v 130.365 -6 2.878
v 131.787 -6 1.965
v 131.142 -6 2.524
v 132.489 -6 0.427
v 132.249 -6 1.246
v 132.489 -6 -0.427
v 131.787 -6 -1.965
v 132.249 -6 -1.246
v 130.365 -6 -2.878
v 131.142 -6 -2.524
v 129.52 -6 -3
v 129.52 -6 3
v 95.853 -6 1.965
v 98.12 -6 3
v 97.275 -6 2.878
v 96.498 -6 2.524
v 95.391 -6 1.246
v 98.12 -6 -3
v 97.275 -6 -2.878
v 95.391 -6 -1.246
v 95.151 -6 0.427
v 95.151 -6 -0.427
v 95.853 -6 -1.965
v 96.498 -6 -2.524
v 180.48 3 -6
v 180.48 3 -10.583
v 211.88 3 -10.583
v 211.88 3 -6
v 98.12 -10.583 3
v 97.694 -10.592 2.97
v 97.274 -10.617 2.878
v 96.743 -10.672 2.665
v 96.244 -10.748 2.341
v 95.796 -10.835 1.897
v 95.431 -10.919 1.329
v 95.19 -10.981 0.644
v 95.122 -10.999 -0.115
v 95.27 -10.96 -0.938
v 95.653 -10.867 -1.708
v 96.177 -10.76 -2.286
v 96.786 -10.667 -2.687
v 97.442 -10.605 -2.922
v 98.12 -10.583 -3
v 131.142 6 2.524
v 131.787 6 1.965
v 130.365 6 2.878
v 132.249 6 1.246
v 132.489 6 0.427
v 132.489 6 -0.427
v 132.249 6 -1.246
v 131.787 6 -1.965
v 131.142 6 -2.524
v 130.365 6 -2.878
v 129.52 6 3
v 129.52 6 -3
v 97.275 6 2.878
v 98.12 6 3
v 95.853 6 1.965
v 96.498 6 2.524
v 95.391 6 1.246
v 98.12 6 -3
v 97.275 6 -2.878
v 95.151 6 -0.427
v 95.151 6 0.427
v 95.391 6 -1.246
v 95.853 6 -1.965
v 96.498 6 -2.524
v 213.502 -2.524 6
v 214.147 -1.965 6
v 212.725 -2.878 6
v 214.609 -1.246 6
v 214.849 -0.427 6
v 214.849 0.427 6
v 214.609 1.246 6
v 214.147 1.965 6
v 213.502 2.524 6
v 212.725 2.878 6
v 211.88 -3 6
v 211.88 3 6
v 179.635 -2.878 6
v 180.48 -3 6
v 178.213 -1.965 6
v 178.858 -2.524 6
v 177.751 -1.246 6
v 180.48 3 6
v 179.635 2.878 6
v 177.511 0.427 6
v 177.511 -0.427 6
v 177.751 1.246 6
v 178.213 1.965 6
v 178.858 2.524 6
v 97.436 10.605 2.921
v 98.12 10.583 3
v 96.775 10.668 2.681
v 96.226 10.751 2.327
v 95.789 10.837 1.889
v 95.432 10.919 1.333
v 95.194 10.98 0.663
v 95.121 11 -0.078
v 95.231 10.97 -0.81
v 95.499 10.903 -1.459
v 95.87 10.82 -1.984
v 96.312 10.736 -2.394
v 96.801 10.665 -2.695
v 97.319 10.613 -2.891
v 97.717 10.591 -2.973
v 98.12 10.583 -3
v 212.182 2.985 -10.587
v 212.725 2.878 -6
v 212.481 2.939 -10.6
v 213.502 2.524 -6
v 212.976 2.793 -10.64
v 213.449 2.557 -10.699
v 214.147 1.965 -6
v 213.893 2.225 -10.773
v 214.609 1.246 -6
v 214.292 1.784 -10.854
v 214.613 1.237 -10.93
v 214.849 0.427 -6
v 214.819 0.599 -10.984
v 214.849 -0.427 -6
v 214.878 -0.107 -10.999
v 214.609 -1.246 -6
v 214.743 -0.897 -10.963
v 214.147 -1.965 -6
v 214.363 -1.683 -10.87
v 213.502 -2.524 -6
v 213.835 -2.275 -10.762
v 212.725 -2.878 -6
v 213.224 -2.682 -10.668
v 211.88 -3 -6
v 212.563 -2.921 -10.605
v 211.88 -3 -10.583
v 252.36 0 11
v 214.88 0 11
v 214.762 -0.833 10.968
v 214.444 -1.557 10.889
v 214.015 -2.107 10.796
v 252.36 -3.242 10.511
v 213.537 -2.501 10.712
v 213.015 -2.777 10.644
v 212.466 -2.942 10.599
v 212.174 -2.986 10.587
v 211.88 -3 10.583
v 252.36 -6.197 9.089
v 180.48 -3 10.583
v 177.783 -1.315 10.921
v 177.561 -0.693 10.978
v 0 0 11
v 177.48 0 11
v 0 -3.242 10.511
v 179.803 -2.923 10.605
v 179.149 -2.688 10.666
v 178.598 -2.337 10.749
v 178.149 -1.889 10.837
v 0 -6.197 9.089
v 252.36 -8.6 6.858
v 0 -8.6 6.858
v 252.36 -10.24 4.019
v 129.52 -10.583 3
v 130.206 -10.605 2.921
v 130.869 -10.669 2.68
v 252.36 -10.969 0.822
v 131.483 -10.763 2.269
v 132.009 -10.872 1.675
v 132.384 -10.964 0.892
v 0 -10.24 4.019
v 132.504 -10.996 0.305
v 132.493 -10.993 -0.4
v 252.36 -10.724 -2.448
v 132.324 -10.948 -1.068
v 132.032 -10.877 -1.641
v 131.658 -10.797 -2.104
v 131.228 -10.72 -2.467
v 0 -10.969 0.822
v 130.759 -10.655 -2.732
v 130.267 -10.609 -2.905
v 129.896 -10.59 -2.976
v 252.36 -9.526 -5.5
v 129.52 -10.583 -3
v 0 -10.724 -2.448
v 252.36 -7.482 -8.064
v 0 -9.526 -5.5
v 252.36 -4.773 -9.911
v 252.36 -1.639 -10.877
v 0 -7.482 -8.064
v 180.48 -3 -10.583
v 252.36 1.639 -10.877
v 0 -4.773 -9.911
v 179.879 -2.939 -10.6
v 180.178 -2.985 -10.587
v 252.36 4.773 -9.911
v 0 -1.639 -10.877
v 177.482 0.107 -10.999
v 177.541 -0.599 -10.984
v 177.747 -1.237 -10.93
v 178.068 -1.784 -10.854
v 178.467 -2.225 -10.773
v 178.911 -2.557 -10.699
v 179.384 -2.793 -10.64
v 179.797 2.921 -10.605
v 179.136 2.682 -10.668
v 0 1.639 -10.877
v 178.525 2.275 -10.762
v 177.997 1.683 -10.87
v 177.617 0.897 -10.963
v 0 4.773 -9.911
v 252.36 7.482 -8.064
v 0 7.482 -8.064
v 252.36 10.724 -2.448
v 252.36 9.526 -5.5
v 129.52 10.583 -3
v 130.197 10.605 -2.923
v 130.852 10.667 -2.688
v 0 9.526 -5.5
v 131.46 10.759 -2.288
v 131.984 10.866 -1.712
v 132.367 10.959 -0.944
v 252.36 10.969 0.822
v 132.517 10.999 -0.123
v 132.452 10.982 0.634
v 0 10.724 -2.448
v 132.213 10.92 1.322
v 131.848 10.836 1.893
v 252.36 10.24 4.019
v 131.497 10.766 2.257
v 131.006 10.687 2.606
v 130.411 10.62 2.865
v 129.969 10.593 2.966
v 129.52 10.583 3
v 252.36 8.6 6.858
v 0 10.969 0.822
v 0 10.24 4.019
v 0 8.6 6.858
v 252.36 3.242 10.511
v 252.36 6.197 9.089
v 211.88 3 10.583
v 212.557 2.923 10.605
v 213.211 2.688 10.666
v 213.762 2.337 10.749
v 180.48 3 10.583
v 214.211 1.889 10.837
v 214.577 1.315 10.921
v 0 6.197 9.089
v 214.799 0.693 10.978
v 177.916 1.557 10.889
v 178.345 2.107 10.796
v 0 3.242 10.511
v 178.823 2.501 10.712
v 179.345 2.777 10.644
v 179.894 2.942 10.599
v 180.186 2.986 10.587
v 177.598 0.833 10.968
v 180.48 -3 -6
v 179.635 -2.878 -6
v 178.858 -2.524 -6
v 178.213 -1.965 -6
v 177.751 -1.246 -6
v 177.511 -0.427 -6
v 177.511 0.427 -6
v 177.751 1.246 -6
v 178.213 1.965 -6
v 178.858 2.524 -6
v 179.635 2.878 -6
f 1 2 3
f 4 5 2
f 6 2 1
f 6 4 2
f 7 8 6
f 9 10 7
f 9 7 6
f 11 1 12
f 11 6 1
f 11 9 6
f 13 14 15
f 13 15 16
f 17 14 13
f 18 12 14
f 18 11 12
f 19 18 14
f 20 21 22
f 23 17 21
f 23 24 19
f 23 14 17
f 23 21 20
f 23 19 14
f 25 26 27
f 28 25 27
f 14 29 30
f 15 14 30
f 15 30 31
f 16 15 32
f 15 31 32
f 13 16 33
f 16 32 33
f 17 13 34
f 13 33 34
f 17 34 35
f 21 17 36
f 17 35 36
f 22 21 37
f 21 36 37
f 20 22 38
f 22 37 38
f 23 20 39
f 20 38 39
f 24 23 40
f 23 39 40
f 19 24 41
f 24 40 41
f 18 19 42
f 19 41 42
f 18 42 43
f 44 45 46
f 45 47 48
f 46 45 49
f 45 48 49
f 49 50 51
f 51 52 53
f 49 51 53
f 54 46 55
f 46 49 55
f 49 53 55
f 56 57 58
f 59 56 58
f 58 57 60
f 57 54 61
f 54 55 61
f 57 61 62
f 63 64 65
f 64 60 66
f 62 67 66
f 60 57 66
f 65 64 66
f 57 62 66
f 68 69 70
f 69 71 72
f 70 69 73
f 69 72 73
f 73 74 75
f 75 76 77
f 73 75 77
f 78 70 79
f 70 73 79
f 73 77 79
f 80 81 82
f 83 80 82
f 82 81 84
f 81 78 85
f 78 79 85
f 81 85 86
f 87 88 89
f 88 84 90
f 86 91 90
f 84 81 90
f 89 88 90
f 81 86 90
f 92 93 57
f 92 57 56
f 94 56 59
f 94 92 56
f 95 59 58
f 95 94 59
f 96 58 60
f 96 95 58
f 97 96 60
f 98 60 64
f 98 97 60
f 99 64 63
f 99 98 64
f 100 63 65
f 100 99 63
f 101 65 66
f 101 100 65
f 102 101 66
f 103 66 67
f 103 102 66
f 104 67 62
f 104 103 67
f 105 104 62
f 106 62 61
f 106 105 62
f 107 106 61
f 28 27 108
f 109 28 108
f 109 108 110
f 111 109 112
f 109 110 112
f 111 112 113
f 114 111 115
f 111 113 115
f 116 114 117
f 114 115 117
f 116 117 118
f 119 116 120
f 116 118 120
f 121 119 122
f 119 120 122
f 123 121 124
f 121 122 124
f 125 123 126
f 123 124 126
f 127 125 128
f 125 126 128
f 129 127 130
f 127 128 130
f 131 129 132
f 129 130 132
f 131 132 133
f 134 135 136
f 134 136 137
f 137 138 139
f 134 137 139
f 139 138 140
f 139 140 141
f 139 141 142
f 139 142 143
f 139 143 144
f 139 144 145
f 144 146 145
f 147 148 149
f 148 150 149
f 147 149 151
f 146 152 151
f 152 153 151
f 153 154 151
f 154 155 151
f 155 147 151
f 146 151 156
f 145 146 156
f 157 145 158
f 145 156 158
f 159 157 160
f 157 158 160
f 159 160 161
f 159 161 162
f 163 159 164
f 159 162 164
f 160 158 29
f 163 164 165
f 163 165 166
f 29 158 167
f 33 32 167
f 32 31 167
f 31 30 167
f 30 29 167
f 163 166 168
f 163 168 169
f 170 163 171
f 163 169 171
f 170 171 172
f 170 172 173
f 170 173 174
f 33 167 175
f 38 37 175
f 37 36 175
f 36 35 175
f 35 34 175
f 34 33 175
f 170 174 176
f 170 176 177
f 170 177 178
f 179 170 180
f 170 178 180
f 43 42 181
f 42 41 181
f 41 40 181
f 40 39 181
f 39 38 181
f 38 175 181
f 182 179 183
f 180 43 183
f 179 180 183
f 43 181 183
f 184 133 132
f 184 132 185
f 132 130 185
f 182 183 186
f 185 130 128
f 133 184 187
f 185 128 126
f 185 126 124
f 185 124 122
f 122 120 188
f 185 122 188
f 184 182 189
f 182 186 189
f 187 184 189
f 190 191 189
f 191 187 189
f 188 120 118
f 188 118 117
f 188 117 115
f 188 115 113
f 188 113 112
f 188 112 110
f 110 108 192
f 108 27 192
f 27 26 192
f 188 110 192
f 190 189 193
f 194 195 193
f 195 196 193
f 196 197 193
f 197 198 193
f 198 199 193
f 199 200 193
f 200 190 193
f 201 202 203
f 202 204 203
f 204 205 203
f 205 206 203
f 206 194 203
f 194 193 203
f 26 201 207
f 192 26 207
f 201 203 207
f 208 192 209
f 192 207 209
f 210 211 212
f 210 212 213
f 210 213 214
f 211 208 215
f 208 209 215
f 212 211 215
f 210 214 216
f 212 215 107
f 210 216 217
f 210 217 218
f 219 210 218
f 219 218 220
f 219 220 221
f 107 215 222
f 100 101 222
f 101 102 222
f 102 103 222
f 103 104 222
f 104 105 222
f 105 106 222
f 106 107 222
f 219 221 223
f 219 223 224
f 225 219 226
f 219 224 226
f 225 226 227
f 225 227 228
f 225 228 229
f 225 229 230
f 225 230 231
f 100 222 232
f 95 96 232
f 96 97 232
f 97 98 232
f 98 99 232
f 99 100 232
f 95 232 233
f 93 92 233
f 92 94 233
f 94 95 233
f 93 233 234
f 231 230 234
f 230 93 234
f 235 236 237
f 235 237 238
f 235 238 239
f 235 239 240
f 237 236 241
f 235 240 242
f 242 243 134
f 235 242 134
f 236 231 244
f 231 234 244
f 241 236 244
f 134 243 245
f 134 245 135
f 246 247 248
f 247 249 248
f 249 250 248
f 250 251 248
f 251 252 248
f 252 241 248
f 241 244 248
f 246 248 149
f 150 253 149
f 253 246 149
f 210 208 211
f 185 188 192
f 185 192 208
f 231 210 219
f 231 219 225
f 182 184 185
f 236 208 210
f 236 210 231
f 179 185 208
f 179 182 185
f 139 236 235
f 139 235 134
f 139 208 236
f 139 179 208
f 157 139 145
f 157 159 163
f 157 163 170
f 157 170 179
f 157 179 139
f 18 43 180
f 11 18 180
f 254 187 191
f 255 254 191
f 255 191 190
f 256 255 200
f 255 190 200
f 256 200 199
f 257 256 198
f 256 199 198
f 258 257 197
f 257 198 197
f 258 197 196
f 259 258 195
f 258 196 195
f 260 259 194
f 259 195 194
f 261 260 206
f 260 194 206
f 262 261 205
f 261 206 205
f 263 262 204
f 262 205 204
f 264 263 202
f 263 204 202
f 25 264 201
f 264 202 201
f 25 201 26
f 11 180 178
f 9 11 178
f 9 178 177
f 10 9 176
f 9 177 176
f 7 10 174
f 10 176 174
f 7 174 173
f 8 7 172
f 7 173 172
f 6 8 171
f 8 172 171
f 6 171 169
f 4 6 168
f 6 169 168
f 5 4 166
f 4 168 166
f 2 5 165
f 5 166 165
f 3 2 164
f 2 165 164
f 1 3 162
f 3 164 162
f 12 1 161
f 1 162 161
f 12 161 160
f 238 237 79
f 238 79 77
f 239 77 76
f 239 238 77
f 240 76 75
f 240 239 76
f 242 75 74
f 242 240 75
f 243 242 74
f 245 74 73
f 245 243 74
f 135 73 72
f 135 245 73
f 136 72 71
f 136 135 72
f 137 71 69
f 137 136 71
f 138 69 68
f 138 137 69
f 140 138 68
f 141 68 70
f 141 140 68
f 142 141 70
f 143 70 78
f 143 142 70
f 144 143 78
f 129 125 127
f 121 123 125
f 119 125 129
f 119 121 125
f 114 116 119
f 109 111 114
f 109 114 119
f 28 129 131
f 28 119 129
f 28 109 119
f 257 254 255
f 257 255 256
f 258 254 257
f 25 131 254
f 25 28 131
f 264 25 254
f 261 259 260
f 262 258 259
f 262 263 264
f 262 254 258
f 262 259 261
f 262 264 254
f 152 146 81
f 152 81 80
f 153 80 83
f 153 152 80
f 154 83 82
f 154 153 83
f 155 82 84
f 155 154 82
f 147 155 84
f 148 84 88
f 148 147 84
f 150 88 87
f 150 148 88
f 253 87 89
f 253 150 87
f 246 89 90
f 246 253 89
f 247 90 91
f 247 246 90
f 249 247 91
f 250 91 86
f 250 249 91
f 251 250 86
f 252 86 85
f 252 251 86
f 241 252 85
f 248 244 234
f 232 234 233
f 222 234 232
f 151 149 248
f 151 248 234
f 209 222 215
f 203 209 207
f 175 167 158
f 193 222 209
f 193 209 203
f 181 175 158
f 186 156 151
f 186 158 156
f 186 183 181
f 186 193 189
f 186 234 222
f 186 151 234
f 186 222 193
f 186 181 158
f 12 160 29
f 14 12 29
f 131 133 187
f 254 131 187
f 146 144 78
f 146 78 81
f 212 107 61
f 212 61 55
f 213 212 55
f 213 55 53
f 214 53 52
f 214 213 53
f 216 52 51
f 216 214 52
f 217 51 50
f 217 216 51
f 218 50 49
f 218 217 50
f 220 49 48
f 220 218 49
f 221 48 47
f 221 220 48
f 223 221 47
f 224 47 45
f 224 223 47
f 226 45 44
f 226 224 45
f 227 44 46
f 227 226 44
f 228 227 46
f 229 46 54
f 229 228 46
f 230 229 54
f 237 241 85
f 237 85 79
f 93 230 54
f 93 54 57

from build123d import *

# Parameters (mm, degrees)
SKETCH1_W           = 140
SKETCH1_H           = 11
CUT_EXTRUDE1_DEPTH  = 5
SKETCH5_R           = 11
BOSS_EXTRUDE1_DEPTH = 97.36
CUT_EXTRUDE2_DEPTH  = 5
SKETCH8_R           = 11
BOSS_EXTRUDE2_DEPTH = 15


with BuildPart() as part:
    # Sketch1 → Revolve1 (revolve)
    with BuildSketch(Plane.XY, mode=Mode.PRIVATE) as revolve1_sk:
        with Locations((70, 5.5)):
            Rectangle(SKETCH1_W, SKETCH1_H)
    revolve(revolve1_sk.sketch.rotate(Axis((0, 0, 0), (1, 0, 0)), 90), axis=Axis((0, 0, 0), (1, 0, 0)))

    # Sketch4 → Cut-Extrude1 (cut)
    with BuildSketch(Plane(origin=(0, 11, 0), x_dir=(1, 0, 0), z_dir=(0, 1, 0))):
        with BuildLine():
            Line((129.52, -3), (98.12, -3))
            ThreePointArc((98.12, -3), (95.12, 0), (98.12, 3))
            Line((98.12, 3), (129.52, 3))
            ThreePointArc((129.52, 3), (132.52, 0), (129.52, -3))
        make_face()
    cut_extrude1 = extrude(amount=-CUT_EXTRUDE1_DEPTH, mode=Mode.SUBTRACT)

    # Mirror1: Cut-Extrude1 across plane
    add(cut_extrude1.mirror(Plane.ZX), mode=Mode.SUBTRACT)

    # Sketch5 → Boss-Extrude1 (add)
    with BuildSketch(Plane(origin=(140, 0, 0), x_dir=(0, 0, -1), z_dir=(1, 0, 0))):
        with Locations(Location((0, 0, 0), (0, 0, 180))):
            Circle(SKETCH5_R)
    extrude(amount=BOSS_EXTRUDE1_DEPTH)

    # Sketch7 → Cut-Extrude2 (cut)
    with BuildSketch(Plane.XY.offset(11)):
        with BuildLine():
            Line((211.88, -3), (180.48, -3))
            ThreePointArc((180.48, -3), (177.48, 0), (180.48, 3))
            Line((180.48, 3), (211.88, 3))
            ThreePointArc((211.88, 3), (214.88, 0), (211.88, -3))
        make_face()
    cut_extrude2 = extrude(amount=-CUT_EXTRUDE2_DEPTH, mode=Mode.SUBTRACT)

    # Mirror2: Cut-Extrude2 across plane
    add(cut_extrude2.mirror(Plane.XY), mode=Mode.SUBTRACT)

    # Sketch8 → Boss-Extrude2 (add)
    with BuildSketch(Plane(origin=(237.36, 0, 0), x_dir=(0, 0, -1), z_dir=(1, 0, 0))):
        with Locations(Location((0, 0, 0), (0, 0, 180))):
            Circle(SKETCH8_R)
    extrude(amount=BOSS_EXTRUDE2_DEPTH)


solid = part.part
